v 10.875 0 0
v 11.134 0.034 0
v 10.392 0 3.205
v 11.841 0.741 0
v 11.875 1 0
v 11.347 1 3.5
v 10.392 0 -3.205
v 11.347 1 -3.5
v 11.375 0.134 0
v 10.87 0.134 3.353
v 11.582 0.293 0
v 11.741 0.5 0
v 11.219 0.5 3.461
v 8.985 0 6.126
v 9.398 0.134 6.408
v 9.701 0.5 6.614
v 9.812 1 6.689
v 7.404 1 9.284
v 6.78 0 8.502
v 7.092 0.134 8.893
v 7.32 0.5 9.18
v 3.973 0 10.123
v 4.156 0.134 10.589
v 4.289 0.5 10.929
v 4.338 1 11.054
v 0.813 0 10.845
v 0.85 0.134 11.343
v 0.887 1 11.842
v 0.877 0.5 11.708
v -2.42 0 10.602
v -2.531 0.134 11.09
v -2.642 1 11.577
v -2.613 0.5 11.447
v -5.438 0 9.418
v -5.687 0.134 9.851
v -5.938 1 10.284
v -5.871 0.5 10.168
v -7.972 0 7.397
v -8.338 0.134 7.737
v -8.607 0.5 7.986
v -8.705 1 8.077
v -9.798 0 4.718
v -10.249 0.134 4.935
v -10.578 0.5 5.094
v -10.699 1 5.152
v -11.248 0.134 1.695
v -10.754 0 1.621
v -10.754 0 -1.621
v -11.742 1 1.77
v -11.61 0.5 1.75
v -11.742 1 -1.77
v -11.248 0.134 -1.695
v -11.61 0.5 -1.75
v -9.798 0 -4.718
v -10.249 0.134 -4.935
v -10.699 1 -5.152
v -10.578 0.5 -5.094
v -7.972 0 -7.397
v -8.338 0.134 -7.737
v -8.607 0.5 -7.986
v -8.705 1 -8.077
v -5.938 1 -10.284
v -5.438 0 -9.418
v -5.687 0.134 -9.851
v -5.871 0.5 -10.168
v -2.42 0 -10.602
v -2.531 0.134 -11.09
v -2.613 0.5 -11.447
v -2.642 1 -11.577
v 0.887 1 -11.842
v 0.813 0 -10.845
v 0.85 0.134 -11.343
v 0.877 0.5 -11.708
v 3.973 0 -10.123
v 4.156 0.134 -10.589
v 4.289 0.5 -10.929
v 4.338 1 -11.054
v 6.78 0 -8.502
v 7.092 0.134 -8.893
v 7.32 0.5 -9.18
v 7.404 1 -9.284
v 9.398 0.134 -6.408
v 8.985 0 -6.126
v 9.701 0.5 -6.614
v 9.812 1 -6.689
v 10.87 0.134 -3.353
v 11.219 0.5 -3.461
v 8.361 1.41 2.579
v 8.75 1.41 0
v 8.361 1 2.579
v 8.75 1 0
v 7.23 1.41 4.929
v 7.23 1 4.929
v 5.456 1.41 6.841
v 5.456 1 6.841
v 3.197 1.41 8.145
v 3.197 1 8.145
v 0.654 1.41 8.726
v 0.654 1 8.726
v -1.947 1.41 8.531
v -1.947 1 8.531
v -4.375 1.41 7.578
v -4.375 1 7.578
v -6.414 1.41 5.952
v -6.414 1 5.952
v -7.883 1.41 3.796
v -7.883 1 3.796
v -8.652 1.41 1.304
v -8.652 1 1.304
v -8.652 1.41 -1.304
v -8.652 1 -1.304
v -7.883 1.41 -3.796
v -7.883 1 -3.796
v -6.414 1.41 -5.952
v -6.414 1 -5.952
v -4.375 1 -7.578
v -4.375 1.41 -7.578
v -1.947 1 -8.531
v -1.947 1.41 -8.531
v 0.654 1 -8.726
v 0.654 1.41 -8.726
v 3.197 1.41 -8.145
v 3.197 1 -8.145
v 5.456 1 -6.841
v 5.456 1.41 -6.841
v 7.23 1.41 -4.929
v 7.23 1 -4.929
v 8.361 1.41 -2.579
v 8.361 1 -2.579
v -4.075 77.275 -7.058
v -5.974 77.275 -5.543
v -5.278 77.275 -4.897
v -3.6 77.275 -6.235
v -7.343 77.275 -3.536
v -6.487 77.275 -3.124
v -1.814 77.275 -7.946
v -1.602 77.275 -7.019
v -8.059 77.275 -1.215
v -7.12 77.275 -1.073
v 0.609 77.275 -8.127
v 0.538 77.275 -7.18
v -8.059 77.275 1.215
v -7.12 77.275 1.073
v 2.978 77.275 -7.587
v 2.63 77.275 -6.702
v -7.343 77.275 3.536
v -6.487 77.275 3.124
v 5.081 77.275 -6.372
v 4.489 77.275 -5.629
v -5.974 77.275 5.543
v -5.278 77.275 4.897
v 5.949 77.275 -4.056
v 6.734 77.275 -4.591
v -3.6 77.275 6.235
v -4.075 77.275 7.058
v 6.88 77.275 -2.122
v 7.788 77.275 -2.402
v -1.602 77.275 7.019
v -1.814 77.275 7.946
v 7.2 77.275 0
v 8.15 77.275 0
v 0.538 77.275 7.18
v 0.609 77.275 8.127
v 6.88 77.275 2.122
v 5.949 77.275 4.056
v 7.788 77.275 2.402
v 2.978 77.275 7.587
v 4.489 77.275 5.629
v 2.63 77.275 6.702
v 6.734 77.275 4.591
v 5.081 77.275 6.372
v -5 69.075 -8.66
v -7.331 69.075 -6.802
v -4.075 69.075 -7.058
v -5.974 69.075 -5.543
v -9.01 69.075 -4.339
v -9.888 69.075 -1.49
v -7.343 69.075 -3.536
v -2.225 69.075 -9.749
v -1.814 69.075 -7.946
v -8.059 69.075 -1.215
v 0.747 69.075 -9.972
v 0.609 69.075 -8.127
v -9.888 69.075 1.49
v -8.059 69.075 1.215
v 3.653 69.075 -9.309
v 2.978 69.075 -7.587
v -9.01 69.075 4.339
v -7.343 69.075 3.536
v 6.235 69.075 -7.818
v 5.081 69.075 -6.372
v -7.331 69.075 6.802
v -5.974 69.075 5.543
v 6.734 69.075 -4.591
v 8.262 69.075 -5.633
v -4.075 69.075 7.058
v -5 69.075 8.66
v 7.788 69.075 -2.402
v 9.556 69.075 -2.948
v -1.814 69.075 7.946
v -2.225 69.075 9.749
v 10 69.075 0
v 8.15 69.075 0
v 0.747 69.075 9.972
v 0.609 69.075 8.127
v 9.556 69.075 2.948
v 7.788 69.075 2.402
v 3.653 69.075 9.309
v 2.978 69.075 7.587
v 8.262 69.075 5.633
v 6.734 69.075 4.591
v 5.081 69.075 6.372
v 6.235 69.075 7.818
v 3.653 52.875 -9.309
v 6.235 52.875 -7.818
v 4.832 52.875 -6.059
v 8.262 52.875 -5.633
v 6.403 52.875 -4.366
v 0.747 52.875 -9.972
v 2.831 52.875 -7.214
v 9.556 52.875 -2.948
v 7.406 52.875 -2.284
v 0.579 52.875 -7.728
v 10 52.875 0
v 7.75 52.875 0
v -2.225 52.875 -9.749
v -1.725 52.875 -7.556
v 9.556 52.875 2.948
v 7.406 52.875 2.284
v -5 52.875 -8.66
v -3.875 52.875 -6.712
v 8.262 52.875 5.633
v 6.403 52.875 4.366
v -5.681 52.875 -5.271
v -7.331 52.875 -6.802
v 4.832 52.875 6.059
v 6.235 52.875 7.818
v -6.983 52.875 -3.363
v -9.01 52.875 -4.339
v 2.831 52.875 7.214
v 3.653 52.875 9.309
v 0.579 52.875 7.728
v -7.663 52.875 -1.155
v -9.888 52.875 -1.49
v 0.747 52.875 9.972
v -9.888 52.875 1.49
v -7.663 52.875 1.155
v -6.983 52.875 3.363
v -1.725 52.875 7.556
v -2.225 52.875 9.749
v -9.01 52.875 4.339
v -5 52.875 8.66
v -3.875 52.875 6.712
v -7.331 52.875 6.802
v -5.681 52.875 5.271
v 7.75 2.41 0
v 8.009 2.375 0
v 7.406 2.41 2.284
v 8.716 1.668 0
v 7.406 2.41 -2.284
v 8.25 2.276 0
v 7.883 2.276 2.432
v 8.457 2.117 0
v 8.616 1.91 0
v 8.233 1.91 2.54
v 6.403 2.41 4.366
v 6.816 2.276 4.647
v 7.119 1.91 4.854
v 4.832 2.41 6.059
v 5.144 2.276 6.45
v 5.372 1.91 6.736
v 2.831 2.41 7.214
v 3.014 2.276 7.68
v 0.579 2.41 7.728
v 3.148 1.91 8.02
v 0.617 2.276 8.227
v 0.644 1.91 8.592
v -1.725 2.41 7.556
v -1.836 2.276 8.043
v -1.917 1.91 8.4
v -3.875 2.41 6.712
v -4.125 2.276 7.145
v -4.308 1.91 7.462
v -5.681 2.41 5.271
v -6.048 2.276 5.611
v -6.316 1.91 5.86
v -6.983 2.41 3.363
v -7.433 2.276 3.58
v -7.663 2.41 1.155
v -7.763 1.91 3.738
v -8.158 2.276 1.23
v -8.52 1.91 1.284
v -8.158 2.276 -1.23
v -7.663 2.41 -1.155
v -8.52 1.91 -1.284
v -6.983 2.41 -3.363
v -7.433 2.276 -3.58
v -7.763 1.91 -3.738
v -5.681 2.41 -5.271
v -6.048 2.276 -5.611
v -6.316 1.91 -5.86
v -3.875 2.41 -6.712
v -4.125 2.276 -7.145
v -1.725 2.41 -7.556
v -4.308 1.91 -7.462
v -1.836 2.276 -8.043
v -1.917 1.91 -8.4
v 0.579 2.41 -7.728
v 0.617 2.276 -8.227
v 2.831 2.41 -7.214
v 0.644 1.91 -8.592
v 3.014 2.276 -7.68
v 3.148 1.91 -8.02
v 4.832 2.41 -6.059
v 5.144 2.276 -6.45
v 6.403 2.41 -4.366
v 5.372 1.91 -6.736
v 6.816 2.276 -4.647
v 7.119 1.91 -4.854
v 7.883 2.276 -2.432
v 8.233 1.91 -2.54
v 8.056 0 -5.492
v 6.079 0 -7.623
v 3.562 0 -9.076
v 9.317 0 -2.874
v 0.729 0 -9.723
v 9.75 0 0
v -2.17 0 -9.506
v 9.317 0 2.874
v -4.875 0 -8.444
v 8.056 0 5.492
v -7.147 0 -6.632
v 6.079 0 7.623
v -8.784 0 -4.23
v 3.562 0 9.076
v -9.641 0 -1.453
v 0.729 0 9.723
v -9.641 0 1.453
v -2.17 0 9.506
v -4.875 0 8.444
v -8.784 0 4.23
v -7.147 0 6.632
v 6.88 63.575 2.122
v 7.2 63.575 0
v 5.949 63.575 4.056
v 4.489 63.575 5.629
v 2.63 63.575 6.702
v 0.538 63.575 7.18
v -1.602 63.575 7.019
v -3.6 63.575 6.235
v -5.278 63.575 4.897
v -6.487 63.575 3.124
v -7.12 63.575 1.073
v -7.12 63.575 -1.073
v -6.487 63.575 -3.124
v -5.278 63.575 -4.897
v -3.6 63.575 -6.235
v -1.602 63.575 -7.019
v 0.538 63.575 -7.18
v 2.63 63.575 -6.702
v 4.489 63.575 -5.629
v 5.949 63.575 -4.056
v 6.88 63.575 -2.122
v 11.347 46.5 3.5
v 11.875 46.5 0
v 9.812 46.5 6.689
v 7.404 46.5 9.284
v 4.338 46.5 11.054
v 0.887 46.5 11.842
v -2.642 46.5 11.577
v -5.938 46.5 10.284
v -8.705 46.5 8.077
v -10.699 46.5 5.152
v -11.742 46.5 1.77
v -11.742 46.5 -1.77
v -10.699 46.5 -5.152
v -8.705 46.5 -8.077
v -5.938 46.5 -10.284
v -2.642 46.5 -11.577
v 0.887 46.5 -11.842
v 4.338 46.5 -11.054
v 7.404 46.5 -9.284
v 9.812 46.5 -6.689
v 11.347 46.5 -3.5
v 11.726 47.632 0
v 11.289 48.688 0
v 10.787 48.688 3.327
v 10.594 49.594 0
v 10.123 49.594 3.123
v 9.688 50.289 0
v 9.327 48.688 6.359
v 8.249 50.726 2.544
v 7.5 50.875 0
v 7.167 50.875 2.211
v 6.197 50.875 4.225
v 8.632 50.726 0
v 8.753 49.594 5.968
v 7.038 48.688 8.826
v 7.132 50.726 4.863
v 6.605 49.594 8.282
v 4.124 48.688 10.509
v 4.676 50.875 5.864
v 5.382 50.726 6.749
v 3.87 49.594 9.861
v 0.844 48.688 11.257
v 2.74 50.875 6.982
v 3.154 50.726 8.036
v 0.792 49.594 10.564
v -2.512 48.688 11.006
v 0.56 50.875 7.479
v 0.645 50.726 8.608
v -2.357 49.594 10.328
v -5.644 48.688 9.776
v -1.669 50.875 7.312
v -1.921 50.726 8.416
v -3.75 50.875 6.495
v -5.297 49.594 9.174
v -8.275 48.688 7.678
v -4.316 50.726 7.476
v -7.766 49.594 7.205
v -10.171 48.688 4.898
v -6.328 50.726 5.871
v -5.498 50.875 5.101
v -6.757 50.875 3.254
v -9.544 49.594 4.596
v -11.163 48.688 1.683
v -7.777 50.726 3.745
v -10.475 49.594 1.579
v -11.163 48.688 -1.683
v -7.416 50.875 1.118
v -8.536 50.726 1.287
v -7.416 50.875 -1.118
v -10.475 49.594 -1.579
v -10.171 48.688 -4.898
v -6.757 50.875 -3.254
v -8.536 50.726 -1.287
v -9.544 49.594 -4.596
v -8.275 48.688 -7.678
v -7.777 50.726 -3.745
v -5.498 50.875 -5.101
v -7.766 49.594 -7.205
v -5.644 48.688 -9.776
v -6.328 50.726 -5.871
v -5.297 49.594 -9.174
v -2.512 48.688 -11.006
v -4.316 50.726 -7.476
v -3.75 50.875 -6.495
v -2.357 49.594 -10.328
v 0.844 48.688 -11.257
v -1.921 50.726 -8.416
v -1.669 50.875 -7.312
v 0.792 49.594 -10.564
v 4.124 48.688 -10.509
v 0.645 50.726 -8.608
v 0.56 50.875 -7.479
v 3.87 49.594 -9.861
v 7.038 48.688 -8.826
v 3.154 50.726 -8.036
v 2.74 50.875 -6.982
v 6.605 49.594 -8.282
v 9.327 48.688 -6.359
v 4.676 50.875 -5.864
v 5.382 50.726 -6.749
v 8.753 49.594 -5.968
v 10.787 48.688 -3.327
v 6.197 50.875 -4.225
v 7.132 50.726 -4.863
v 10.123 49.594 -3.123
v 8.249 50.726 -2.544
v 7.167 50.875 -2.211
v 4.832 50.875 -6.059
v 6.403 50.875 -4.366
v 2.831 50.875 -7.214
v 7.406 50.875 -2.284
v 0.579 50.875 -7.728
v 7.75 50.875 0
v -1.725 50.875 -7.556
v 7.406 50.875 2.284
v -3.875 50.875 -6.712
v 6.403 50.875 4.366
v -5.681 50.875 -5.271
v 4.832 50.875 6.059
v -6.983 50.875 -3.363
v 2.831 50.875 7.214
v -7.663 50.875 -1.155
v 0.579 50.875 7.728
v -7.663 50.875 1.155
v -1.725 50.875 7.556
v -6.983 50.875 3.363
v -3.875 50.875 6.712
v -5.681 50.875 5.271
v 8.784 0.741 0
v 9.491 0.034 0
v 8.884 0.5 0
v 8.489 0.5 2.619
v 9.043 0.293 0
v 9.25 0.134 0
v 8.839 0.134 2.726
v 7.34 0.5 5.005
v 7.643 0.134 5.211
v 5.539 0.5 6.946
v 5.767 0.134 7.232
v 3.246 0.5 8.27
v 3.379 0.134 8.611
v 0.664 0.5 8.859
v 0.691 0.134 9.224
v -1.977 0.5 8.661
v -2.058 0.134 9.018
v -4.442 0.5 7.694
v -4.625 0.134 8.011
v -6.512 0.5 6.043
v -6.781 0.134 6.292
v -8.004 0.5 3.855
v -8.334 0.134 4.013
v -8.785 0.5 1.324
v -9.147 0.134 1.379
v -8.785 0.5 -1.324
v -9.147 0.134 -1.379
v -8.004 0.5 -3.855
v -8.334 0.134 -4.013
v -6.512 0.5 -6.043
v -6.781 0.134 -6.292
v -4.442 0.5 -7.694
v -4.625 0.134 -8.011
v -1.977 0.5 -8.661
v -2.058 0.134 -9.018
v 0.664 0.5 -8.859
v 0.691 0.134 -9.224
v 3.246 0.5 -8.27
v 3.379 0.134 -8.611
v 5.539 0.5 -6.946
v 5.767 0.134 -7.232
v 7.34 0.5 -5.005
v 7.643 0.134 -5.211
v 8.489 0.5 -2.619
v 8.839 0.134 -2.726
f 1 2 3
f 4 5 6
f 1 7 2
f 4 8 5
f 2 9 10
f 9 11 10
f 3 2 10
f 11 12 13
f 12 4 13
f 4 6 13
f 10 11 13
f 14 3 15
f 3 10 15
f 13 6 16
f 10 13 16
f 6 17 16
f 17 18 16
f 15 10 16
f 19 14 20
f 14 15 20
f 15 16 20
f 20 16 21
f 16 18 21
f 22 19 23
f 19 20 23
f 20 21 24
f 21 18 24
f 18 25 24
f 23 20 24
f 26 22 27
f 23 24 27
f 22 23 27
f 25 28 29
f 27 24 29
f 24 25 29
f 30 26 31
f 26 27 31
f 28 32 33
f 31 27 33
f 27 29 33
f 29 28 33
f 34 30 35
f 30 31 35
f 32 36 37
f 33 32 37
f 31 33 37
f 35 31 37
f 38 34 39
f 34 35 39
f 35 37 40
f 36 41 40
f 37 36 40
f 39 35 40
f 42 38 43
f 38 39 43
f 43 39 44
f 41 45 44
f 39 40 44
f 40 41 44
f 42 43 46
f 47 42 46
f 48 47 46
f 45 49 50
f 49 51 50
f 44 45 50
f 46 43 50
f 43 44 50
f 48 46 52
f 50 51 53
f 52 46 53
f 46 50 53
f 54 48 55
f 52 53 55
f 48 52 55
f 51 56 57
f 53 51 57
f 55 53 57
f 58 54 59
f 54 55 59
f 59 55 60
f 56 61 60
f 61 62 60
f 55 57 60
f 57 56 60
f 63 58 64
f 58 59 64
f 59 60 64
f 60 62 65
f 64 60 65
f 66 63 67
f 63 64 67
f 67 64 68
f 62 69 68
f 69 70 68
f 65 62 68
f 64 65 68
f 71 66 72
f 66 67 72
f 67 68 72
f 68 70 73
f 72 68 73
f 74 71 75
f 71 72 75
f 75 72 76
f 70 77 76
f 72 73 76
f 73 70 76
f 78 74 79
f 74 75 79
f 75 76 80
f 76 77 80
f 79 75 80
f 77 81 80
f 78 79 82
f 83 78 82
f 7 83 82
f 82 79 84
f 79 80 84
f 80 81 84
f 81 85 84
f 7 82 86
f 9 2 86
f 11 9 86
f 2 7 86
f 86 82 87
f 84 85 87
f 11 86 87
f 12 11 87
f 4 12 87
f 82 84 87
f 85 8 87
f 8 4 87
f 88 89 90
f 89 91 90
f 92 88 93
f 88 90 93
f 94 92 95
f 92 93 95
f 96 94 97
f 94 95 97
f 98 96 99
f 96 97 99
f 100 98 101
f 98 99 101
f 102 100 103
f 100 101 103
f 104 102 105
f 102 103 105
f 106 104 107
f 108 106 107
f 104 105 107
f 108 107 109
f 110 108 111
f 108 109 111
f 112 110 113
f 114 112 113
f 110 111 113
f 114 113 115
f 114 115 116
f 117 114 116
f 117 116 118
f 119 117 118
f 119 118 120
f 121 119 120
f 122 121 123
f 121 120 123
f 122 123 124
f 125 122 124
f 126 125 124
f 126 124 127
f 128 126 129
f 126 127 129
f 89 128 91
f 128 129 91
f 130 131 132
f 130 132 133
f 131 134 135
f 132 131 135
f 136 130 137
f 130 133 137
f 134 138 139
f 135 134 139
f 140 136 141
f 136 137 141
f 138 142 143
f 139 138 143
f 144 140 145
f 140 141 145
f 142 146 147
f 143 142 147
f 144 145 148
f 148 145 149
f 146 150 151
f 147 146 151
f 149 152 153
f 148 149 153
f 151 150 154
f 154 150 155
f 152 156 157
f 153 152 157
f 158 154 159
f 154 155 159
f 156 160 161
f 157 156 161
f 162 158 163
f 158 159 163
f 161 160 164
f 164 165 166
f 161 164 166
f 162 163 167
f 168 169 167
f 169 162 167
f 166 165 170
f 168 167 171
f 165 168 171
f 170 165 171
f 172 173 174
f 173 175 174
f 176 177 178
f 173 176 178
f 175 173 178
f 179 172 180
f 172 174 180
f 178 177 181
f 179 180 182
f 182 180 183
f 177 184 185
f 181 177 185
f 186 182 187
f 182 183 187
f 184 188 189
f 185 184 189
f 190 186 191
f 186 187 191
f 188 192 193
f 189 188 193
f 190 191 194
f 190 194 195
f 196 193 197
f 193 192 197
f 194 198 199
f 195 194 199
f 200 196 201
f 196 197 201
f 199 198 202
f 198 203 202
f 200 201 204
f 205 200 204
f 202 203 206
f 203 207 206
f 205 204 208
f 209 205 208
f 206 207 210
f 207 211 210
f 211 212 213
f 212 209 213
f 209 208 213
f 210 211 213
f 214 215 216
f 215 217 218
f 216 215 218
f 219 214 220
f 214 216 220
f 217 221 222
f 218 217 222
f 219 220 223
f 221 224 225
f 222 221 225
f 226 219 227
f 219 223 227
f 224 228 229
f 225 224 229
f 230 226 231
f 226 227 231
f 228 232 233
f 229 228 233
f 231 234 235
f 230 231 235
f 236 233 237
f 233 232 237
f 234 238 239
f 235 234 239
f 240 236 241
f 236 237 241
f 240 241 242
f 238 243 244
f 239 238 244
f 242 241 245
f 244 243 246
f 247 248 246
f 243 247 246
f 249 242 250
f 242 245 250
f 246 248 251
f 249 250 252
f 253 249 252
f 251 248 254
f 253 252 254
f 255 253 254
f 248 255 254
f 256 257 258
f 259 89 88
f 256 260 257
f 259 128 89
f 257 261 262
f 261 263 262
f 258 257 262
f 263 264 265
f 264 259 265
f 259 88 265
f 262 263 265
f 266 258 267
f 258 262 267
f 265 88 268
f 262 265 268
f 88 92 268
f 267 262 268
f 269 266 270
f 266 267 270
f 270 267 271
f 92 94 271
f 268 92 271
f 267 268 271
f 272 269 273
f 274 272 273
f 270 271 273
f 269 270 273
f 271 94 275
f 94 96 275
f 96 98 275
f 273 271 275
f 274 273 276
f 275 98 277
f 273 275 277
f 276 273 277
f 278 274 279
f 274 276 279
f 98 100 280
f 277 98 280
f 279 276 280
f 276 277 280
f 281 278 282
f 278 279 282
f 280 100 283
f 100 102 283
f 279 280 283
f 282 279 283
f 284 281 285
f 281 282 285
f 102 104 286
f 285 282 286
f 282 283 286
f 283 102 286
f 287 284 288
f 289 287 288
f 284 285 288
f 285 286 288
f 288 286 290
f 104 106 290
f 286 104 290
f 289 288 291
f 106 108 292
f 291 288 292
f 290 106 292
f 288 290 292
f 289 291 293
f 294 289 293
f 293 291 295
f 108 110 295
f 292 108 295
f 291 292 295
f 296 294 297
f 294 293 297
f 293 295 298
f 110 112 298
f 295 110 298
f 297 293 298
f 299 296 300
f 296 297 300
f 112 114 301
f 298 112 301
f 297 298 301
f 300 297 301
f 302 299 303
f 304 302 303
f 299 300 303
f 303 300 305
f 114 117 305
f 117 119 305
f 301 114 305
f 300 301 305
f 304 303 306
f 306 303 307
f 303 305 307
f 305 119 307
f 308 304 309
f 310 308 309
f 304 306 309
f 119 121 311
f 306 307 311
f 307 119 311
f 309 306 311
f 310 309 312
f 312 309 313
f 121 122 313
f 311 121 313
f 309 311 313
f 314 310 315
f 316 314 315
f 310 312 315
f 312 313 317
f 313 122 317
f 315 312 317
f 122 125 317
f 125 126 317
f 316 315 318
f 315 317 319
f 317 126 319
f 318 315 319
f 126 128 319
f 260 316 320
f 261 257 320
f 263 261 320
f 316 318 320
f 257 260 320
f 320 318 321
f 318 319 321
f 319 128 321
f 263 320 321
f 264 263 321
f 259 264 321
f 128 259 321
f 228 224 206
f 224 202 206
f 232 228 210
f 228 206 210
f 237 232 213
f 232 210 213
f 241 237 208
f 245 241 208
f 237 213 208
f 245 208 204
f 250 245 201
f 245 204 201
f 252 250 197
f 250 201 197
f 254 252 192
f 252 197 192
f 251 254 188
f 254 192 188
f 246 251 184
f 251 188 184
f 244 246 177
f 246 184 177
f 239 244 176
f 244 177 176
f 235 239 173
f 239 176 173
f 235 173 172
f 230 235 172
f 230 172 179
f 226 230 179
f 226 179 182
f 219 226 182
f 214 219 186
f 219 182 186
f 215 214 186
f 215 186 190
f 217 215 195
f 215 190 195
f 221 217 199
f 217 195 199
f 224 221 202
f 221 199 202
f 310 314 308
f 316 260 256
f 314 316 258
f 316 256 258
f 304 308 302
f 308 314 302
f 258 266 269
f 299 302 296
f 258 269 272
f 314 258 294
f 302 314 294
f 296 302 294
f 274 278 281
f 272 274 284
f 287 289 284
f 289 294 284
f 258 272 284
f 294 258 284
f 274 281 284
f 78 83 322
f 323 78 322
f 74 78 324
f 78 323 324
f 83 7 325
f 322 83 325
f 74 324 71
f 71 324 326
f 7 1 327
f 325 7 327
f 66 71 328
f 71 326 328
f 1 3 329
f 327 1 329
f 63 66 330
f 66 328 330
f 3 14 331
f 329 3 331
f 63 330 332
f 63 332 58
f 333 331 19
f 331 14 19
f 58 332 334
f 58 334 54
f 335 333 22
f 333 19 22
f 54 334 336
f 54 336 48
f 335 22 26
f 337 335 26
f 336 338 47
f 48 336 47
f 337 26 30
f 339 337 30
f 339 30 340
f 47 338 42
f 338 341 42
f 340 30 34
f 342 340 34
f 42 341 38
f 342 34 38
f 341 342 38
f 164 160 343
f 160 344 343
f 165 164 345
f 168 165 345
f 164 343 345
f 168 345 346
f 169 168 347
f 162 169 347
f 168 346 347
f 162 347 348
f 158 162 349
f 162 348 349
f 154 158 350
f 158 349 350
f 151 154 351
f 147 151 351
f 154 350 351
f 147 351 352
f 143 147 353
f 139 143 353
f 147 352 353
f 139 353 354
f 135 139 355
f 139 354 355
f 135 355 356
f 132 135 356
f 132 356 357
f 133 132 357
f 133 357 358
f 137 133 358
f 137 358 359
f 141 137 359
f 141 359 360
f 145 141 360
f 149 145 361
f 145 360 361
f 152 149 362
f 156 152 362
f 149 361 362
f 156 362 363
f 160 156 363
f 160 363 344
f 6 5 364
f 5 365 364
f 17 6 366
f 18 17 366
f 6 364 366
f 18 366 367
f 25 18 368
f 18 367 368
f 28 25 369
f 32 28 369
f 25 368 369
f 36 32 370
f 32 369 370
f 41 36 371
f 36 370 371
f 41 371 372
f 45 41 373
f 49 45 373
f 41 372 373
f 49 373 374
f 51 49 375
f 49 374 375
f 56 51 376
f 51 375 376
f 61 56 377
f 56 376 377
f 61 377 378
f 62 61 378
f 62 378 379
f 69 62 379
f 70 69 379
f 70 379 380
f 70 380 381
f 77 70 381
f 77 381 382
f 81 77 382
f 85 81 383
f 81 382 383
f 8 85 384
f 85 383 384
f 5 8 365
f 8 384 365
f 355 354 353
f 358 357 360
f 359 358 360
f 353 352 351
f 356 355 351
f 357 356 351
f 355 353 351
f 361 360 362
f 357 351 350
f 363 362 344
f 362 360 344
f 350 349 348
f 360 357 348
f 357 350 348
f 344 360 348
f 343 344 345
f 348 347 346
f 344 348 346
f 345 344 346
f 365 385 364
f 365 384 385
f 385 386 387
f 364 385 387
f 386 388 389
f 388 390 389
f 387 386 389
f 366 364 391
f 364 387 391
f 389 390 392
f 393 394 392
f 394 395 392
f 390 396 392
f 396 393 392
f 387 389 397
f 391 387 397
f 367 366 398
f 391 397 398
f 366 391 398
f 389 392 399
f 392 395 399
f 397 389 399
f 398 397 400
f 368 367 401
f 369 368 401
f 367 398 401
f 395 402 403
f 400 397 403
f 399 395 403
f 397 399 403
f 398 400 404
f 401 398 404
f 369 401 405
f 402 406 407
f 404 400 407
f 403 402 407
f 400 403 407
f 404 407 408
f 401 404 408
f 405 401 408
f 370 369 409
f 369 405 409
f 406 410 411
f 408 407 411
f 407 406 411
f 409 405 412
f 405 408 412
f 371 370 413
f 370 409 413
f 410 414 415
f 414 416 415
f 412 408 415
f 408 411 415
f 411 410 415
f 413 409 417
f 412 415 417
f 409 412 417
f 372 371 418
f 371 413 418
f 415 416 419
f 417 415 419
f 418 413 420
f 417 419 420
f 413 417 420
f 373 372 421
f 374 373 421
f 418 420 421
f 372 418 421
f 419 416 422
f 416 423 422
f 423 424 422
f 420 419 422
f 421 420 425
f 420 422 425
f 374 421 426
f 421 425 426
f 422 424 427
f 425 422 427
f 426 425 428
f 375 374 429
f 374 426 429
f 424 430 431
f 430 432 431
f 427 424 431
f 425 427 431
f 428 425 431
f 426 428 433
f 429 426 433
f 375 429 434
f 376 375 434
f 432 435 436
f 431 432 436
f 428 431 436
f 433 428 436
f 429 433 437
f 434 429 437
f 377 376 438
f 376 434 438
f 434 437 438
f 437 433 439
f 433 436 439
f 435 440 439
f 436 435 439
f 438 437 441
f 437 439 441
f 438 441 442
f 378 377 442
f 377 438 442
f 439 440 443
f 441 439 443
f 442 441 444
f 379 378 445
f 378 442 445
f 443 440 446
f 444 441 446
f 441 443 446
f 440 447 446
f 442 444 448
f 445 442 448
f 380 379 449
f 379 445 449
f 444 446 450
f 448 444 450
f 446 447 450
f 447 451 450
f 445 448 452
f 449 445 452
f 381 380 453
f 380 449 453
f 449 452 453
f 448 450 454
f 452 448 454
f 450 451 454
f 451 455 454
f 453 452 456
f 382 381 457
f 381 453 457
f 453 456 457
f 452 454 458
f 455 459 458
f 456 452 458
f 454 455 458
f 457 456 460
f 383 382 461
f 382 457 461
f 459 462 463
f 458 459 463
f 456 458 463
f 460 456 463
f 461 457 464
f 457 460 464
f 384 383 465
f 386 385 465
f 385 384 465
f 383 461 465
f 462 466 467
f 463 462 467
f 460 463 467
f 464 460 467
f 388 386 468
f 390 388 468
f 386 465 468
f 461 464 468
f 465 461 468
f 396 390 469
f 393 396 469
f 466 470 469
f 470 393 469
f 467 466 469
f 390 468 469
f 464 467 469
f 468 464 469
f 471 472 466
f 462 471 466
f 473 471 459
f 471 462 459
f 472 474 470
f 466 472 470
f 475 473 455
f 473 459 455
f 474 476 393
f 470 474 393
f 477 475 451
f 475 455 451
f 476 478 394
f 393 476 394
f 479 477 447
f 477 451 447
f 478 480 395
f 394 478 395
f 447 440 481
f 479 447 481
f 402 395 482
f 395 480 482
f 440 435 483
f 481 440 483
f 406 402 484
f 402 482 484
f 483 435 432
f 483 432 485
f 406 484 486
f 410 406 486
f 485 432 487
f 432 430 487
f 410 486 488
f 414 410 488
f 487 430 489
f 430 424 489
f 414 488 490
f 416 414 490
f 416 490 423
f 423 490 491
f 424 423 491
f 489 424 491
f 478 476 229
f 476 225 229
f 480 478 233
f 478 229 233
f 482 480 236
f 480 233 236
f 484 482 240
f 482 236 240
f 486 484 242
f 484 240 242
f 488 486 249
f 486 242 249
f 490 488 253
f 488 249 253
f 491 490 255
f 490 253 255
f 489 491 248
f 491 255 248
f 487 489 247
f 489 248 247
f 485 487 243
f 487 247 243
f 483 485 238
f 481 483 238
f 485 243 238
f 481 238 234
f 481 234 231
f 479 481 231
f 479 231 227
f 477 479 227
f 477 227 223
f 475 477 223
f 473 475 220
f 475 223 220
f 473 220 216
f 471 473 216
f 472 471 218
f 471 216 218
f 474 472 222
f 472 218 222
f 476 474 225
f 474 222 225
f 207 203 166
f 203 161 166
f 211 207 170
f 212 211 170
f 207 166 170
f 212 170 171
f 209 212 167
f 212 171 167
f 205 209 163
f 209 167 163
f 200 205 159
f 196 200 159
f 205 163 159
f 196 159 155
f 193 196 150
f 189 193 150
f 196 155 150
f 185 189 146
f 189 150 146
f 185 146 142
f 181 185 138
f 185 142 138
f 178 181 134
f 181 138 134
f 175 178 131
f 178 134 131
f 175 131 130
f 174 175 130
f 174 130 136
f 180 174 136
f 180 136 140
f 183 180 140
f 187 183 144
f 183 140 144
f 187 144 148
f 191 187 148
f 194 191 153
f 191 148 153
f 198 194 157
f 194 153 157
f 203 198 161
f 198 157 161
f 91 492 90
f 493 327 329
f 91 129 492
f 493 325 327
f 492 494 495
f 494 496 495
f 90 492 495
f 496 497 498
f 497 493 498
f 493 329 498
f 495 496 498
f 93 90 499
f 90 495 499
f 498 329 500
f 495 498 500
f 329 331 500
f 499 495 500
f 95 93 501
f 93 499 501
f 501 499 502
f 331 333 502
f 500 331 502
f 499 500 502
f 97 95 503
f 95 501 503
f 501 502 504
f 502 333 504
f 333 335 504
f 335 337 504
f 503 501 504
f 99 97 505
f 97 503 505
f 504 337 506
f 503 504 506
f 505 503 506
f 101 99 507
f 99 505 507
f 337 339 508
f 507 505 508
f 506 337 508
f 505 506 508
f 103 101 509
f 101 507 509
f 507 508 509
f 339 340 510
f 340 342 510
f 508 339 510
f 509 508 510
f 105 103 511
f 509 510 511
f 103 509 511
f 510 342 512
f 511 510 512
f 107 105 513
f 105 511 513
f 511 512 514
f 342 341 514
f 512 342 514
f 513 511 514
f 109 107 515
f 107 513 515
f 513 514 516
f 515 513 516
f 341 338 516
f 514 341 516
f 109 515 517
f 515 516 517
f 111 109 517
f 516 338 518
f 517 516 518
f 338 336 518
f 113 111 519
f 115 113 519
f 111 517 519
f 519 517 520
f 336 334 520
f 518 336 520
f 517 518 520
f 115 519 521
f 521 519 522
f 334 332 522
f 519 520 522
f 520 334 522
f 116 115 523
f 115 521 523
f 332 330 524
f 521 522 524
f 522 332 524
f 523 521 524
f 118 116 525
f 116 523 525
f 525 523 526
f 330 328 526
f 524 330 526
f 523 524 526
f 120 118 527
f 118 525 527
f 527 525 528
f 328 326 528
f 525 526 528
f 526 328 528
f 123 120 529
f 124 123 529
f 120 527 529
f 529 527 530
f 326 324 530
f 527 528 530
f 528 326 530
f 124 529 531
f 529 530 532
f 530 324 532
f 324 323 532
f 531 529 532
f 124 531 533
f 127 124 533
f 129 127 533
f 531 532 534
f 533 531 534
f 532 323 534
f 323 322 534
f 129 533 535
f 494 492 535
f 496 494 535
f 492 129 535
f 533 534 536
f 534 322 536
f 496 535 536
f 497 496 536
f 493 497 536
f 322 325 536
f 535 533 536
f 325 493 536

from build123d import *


with BuildPart() as part:
    # Sketch1 → Revolve1 (revolve)
    with BuildSketch(Plane.XY):
        with BuildLine():
            ThreePointArc((8.75, 1), (9.042893219, 0.292893219), (9.75, 0))
            Line((9.75, 0), (10.875, 0))
            ThreePointArc((10.875, 0), (11.582106781, 0.292893219), (11.875, 1))
            Line((11.875, 1), (11.875, 46.5))
            ThreePointArc((11.875, 46.5), (10.593592168, 49.593592168), (7.5, 50.875))
            Line((7.5, 50.875), (7.75, 50.875))
            Line((7.75, 50.875), (7.75, 52.875))
            Line((7.75, 52.875), (10, 52.875))
            Line((10, 52.875), (10, 69.075))
            Line((10, 69.075), (8.15, 69.075))
            Line((8.15, 69.075), (8.15, 77.275))
            Line((8.15, 77.275), (7.2, 77.275))
            Line((7.2, 77.275), (7.2, 63.575))
            Line((7.2, 63.575), (0, 63.575))
            Line((0, 63.575), (0, 2.409558552))
            Line((0, 2.409558552), (7.75, 2.409558552))
            ThreePointArc((7.75, 2.409558552), (8.457106781, 2.116665333), (8.75, 1.409558552))
            Line((8.75, 1.409558552), (8.75, 1))
        make_face()
    revolve(axis=Axis((0, 65.8, 0), (0, -1, 0)))


solid = part.part
